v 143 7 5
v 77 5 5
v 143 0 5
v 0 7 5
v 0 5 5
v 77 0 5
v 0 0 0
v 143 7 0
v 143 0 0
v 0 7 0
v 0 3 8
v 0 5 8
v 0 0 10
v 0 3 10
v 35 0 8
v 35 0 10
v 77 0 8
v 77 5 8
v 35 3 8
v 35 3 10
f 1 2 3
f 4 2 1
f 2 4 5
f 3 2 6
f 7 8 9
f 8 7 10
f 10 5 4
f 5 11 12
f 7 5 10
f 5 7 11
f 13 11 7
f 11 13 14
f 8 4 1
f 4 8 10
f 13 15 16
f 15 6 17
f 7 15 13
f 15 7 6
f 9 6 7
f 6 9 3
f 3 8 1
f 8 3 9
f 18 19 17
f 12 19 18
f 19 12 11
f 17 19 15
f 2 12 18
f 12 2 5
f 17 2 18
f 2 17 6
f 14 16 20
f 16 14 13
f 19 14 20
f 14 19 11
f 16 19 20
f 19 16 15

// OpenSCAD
translate([5.5, 3.5, 2.5]) color([0.2827478909480132, 0.13442052583382869, 0.5230599837537087]) cube([11, 7, 5], center=true);
translate([16.5, 3.5, 2.5]) color([0.21027834364306774, 0.10530639745894443, 0.9556548717215211]) cube([11, 7, 5], center=true);
translate([27.5, 3.5, 2.5]) color([0.5435731515542631, 0.7414270622920264, 0.9040457292510377]) cube([11, 7, 5], center=true);
translate([38.5, 3.5, 2.5]) color([0.2786145977098805, 0.4423646135017597, 0.5682329433322765]) cube([11, 7, 5], center=true);
translate([49.5, 3.5, 2.5]) color([0.13781274972163116, 0.1232982180791492, 0.12051785276403837]) cube([11, 7, 5], center=true);
translate([60.5, 3.5, 2.5]) color([0.4012165411640888, 0.4679428423906348, 0.5596131508667647]) cube([11, 7, 5], center=true);
translate([71.5, 3.5, 2.5]) color([0.29896126951320356, 0.6321114709426877, 0.7423454703026071]) cube([11, 7, 5], center=true);
translate([82.5, 3.5, 2.5]) color([0.21800995973285464, 0.48885816108208613, 0.501567157493831]) cube([11, 7, 5], center=true);
translate([93.5, 3.5, 2.5]) color([0.49271975198428686, 0.958422556968198, 0.44398175403613704]) cube([11, 7, 5], center=true);
translate([104.5, 3.5, 2.5]) color([0.14281143058247625, 0.4955231327742775, 0.8873352305676206]) cube([11, 7, 5], center=true);
translate([115.5, 3.5, 2.5]) color([0.21571394075115613, 0.3554013630116646, 0.39096604949642]) cube([11, 7, 5], center=true);
translate([126.5, 3.5, 2.5]) color([0.9928835035123682, 0.8462248334797323, 0.9789066021625461]) cube([11, 7, 5], center=true);
translate([137.5, 3.5, 2.5]) color([0.6868956228130294, 0.08137290691060206, 0.9493092651810784]) cube([11, 7, 5], center=true);
translate([3.5, 2.5, 6.5]) color([0.9246190463677613, 0.3951154575230438, 0.3612783181755085]) cube([7, 5, 3], center=true);
translate([10.5, 2.5, 6.5]) color([0.11615210489091876, 0.0037403702712440756, 0.2703277384724262]) cube([7, 5, 3], center=true);
translate([17.5, 2.5, 6.5]) color([0.6403732426441148, 0.29252642189785794, 0.9007258804640697]) cube([7, 5, 3], center=true);
translate([24.5, 2.5, 6.5]) color([0.14067978971908934, 0.5728503338092871, 0.1912043400515635]) cube([7, 5, 3], center=true);
translate([31.5, 2.5, 6.5]) color([0.43401891336511733, 0.7163457448050065, 0.3841301513333275]) cube([7, 5, 3], center=true);
translate([38.5, 2.5, 6.5]) color([0.33069552050314754, 0.6480049557775331, 0.6874717059379091]) cube([7, 5, 3], center=true);
translate([45.5, 2.5, 6.5]) color([0.14801928734251768, 0.93323205939552, 0.14750072005511716]) cube([7, 5, 3], center=true);
translate([52.5, 2.5, 6.5]) color([0.31607169754224296, 0.2088660889148145, 0.1868244368145192]) cube([7, 5, 3], center=true);
translate([59.5, 2.5, 6.5]) color([0.3491672112743387, 0.9834841816788549, 0.427290207198605]) cube([7, 5, 3], center=true);
translate([66.5, 2.5, 6.5]) color([0.49195852420878716, 0.7297831417632067, 0.7955834433152874]) cube([7, 5, 3], center=true);
translate([73.5, 2.5, 6.5]) color([0.43927203819181504, 0.2042687131951023, 0.709997013582239]) cube([7, 5, 3], center=true);
translate([2.5, 1.5, 9.0]) color([0.9058221085991531, 0.03327924187503195, 0.6331757983912308]) cube([5, 3, 2], center=true);
translate([7.5, 1.5, 9.0]) color([0.8710093735661795, 0.3636101637556439, 0.7431628081058981]) cube([5, 3, 2], center=true);
translate([12.5, 1.5, 9.0]) color([0.6774926049513658, 0.23306417175218364, 0.2975271762349214]) cube([5, 3, 2], center=true);
translate([17.5, 1.5, 9.0]) color([0.0866296567389645, 0.8688435220131177, 0.7514921149941085]) cube([5, 3, 2], center=true);
translate([22.5, 1.5, 9.0]) color([0.7714305883456576, 0.8829516943772963, 0.4114323292545551]) cube([5, 3, 2], center=true);
translate([27.5, 1.5, 9.0]) color([0.05394001775890156, 0.696805048854085, 0.6656296547984208]) cube([5, 3, 2], center=true);
translate([32.5, 1.5, 9.0]) color([0.6485122289860075, 0.5471816206705559, 0.7344166333532061]) cube([5, 3, 2], center=true);
